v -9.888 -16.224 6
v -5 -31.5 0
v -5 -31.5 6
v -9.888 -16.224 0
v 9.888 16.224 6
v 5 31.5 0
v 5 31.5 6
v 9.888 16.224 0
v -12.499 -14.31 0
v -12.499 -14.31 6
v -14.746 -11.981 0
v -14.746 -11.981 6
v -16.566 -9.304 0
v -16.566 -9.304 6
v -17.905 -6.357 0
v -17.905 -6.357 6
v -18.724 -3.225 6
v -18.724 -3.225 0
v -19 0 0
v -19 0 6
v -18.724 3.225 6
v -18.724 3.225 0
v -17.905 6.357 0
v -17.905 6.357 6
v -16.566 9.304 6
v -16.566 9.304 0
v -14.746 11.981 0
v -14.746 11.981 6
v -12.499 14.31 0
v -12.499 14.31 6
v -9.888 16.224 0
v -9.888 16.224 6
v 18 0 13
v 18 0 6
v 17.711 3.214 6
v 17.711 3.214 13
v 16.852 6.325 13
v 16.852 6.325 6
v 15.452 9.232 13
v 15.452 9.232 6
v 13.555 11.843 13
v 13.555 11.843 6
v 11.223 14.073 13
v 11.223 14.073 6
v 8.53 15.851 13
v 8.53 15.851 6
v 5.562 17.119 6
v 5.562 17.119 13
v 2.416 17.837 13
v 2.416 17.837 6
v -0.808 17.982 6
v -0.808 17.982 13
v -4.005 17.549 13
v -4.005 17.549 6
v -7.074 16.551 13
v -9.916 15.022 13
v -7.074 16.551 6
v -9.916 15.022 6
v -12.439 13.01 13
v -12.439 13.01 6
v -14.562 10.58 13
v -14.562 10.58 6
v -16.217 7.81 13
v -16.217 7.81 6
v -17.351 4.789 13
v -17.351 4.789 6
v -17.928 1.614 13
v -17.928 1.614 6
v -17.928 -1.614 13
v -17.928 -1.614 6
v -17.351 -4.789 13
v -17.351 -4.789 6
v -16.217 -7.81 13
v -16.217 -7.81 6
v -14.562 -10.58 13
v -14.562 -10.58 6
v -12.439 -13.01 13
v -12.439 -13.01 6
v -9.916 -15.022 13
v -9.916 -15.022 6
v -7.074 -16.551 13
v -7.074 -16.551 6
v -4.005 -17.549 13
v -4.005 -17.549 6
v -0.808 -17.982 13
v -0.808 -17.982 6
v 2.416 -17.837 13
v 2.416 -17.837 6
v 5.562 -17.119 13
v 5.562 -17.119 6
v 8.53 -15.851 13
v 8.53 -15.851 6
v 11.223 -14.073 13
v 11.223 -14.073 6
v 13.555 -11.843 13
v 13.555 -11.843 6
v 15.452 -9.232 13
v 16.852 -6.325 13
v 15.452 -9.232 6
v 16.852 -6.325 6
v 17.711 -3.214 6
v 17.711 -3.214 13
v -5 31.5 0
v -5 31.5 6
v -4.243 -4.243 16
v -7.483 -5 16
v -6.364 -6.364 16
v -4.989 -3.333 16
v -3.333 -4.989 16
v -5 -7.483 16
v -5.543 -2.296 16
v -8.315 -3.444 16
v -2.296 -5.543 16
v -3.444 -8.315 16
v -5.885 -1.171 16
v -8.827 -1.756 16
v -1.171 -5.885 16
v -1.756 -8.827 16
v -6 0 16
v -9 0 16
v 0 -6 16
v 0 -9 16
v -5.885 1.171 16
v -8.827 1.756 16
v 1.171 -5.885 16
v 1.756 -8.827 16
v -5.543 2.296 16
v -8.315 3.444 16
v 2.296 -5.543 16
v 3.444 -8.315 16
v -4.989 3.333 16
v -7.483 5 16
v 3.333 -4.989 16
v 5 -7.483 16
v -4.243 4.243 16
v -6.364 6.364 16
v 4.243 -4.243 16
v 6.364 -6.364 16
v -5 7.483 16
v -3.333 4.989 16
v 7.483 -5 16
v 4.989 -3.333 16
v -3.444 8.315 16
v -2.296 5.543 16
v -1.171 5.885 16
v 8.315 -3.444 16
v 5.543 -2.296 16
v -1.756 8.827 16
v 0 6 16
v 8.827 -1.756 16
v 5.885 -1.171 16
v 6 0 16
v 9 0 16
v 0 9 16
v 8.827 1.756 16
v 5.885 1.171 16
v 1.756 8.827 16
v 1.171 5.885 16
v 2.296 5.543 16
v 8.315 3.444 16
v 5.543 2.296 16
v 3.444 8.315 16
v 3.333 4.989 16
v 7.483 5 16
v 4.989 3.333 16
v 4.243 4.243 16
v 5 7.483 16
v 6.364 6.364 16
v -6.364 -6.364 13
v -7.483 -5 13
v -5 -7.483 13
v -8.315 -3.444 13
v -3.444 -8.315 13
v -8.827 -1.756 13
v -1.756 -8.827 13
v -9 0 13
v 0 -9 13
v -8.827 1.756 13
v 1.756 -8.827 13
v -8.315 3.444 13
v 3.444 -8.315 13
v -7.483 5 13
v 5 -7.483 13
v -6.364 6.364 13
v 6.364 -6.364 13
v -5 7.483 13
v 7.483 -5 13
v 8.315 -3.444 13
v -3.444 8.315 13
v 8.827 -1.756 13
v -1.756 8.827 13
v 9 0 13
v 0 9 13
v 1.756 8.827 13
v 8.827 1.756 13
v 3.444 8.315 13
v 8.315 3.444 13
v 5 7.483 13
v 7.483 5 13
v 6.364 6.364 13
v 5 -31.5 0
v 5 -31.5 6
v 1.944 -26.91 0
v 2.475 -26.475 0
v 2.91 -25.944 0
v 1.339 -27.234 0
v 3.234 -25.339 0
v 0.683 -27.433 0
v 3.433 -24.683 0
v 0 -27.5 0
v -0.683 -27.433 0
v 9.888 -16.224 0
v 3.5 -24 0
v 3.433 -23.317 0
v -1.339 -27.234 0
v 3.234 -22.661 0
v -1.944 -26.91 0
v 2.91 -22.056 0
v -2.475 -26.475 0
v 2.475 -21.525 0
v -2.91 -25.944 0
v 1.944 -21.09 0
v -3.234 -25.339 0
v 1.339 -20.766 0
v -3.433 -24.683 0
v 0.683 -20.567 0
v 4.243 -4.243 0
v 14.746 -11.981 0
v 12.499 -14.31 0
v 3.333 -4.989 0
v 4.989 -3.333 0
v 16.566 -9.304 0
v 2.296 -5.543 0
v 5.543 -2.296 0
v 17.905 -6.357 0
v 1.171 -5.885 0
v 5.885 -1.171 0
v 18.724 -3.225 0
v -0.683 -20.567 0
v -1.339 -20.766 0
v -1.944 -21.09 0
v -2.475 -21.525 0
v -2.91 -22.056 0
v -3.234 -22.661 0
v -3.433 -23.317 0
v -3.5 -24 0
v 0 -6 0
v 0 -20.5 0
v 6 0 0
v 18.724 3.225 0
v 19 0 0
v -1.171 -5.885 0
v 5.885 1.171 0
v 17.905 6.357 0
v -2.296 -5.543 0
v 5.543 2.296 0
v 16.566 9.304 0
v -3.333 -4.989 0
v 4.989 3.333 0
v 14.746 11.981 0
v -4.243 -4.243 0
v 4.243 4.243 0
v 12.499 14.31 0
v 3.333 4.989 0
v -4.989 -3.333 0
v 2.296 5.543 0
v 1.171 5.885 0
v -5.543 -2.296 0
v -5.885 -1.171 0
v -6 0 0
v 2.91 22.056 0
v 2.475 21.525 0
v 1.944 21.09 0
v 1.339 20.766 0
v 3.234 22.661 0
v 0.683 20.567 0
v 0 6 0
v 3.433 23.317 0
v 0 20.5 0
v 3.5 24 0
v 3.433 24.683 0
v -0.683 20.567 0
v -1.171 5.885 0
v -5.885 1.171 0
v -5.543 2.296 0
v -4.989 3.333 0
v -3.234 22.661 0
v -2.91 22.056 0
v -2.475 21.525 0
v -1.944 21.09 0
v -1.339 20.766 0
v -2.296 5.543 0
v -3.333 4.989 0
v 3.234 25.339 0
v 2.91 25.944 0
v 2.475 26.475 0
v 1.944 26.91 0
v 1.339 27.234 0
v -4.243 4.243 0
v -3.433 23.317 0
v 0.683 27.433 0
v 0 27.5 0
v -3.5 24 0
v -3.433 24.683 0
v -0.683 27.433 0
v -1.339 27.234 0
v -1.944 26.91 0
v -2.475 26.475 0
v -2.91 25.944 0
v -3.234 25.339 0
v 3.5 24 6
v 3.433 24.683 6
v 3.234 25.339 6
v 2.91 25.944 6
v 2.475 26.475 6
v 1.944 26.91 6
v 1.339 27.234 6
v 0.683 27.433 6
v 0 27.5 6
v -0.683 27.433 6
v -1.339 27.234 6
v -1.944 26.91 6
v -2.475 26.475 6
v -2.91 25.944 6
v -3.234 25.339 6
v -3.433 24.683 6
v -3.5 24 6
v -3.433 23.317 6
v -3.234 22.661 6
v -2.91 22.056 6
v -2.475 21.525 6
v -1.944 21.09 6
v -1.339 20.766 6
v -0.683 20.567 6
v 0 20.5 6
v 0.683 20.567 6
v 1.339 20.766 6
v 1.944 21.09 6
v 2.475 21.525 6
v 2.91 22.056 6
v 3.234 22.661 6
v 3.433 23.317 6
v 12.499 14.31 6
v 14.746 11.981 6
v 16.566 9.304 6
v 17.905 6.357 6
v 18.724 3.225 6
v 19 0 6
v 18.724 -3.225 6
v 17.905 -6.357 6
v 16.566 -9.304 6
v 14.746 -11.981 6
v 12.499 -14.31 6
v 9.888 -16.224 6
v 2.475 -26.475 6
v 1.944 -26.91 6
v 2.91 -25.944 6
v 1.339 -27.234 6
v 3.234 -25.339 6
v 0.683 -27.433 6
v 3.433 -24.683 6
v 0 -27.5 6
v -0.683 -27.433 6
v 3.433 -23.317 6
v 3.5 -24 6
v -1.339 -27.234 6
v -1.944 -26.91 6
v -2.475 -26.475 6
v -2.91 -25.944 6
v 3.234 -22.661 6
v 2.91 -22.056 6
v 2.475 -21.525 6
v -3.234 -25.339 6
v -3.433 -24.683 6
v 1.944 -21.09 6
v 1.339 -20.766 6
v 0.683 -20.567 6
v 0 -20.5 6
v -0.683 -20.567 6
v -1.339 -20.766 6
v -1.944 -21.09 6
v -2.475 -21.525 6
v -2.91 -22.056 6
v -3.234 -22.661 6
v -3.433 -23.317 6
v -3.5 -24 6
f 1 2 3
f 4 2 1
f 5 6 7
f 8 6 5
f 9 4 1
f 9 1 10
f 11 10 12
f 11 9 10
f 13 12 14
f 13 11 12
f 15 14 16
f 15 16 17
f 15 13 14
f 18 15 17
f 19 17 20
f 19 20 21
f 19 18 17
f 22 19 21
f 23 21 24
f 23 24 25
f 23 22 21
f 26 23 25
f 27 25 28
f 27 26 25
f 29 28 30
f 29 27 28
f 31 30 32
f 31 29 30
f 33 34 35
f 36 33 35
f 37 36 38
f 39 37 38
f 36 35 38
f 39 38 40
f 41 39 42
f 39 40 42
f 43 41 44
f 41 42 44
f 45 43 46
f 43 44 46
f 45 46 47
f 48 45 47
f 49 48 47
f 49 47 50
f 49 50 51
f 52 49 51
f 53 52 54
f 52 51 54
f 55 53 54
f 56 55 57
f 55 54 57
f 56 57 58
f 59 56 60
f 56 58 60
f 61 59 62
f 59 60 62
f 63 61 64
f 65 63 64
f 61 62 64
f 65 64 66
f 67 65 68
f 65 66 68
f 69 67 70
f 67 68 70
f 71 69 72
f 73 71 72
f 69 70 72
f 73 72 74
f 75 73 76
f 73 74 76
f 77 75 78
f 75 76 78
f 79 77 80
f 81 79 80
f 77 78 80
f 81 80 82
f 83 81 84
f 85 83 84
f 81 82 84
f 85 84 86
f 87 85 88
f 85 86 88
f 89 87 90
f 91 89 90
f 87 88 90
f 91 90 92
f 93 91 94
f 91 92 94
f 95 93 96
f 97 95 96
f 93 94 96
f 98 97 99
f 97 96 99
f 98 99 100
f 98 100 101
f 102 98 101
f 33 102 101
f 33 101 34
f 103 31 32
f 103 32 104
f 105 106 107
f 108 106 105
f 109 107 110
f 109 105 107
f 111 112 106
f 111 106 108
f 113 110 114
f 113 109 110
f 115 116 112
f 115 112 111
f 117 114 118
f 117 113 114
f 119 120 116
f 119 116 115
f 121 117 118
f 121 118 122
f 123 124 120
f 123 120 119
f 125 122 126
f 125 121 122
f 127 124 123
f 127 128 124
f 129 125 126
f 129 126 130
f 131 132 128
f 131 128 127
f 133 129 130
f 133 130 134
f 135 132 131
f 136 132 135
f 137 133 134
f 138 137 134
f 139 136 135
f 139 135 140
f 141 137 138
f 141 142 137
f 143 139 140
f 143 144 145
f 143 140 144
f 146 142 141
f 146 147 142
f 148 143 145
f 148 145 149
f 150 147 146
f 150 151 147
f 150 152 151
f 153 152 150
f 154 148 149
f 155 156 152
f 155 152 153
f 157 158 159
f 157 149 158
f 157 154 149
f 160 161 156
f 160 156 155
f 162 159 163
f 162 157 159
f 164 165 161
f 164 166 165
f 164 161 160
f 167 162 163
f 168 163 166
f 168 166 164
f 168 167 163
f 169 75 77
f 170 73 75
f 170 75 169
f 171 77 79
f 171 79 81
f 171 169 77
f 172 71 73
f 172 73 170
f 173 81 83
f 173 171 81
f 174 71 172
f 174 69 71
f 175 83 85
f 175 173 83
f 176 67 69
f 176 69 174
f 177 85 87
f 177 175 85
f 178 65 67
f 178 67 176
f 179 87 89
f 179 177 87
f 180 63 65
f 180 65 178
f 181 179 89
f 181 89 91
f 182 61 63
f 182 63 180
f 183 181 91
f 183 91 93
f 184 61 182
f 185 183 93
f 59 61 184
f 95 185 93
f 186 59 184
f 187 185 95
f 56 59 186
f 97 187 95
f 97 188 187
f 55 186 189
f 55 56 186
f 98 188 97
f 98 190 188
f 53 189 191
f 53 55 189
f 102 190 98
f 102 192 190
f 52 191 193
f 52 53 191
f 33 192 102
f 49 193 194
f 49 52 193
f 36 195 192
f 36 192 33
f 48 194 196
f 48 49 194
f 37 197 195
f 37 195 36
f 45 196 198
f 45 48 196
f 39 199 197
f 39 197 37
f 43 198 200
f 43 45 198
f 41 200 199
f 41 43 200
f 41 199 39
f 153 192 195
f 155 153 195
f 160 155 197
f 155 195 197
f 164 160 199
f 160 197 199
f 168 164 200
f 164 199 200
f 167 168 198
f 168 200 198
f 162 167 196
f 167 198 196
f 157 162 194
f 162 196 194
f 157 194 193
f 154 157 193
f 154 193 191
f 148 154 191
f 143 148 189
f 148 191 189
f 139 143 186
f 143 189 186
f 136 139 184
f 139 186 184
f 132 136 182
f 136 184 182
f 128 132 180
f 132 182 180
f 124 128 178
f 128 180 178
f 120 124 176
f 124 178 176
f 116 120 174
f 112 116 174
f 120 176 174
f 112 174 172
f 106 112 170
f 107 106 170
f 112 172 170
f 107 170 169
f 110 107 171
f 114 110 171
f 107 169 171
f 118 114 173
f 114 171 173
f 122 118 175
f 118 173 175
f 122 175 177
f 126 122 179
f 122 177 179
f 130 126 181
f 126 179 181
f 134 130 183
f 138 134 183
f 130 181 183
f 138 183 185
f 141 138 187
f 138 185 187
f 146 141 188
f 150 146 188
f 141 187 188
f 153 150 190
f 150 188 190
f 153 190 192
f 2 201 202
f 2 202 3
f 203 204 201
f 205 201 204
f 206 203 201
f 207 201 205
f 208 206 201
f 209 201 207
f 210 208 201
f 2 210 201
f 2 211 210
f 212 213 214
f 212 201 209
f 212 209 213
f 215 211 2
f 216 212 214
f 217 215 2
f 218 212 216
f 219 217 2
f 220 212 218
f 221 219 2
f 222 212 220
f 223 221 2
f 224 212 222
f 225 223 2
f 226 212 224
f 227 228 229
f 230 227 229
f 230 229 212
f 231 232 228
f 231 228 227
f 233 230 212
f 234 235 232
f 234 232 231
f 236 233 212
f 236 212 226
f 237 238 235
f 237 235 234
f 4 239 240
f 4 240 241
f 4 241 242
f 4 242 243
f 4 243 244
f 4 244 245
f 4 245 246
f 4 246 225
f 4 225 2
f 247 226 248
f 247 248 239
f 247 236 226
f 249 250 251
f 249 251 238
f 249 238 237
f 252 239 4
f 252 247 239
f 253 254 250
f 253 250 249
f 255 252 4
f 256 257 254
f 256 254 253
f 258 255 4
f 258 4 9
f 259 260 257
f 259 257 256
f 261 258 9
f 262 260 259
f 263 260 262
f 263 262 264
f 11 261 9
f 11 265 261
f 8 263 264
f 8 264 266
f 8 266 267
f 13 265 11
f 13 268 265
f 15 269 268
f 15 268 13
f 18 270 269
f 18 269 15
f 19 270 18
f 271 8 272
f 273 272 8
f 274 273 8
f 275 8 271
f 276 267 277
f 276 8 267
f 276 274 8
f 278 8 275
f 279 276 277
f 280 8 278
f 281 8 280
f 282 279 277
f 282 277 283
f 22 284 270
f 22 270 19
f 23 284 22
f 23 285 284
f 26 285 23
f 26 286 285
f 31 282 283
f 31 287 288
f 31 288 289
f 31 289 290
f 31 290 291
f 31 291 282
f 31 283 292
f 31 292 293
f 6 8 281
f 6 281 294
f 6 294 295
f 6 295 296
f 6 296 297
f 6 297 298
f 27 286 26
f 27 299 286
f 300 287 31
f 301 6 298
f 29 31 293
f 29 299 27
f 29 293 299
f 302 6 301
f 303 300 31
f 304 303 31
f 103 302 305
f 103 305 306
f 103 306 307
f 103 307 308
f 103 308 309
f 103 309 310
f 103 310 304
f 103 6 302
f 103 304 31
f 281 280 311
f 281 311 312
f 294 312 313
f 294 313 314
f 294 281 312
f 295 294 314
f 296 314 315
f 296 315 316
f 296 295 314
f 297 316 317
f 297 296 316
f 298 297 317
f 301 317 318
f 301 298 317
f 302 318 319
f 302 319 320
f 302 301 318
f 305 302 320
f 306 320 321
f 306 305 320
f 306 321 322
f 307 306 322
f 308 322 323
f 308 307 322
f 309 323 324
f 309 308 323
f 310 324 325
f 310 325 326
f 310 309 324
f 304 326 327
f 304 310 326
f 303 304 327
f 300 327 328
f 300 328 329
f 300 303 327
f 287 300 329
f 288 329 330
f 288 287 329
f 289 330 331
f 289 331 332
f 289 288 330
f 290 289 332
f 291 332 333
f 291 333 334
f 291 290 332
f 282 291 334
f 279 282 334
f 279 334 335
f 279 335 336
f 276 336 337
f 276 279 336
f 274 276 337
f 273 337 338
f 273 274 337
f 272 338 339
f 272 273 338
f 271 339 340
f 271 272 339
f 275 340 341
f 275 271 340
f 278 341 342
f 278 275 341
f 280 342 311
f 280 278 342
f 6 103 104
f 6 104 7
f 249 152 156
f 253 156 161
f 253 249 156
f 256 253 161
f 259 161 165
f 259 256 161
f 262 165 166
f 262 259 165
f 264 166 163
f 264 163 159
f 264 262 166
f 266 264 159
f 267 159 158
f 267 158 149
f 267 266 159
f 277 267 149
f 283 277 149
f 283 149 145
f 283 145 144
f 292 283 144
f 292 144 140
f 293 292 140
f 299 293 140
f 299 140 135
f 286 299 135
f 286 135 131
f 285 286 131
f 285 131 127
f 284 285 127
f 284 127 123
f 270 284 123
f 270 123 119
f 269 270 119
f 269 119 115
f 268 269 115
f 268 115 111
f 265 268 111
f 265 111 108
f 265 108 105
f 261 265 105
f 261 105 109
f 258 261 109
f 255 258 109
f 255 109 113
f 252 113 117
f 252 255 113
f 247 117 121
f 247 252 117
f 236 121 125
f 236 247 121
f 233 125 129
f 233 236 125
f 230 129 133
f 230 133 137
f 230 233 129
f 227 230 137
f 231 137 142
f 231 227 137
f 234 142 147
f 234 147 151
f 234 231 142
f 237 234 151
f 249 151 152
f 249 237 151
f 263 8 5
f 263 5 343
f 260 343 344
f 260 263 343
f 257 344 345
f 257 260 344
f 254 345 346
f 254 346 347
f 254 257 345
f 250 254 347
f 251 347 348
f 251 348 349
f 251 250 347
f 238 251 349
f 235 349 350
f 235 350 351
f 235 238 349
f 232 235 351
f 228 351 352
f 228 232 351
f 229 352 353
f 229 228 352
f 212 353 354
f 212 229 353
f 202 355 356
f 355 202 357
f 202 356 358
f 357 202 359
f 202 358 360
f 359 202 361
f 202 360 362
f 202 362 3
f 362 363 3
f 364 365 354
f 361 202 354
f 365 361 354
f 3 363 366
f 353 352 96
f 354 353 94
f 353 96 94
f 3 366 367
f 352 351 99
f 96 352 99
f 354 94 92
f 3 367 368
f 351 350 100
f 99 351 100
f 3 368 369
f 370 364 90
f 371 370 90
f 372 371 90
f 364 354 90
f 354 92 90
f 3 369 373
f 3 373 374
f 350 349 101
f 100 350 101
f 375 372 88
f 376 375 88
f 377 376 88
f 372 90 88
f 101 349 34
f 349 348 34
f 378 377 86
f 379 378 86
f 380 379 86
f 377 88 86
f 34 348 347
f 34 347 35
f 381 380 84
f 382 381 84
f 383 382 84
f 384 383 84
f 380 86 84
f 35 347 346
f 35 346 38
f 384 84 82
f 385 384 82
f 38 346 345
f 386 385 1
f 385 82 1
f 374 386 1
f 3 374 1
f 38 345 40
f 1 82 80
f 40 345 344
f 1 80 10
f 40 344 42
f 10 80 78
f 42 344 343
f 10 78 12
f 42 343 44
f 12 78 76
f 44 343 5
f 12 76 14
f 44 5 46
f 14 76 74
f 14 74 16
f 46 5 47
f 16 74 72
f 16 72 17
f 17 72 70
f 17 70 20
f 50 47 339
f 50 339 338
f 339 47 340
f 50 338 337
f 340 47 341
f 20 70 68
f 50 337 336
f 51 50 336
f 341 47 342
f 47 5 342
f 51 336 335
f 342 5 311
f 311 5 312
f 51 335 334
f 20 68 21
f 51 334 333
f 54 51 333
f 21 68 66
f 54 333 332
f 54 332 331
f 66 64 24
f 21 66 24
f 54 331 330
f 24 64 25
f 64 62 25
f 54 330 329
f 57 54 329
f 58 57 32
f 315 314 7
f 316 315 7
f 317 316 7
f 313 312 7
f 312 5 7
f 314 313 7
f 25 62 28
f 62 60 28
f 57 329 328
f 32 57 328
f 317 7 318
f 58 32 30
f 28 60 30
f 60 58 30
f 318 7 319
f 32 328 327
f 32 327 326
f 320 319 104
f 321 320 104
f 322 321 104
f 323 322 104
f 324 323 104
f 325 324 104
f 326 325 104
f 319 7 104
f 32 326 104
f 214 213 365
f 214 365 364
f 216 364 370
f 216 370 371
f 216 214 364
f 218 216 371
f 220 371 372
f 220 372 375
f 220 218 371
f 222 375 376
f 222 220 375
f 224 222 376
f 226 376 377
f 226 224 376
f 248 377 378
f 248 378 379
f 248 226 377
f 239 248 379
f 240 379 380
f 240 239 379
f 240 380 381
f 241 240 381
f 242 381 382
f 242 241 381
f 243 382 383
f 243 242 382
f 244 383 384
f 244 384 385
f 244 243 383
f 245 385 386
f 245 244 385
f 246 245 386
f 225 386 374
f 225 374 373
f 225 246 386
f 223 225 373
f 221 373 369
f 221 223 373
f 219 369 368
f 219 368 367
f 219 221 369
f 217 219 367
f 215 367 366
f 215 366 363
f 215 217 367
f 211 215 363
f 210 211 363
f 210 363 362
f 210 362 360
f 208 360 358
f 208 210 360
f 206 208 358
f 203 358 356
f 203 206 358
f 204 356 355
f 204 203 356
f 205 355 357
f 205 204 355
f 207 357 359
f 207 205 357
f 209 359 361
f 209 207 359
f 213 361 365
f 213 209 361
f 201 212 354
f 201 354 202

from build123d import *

# Parameters (mm, degrees)
SKETCH_1_R          = 3.5
SKETCH_1_R_2        = 6
EXTRUDE_1_DEPTH     = 6
SKETCH_2_R          = 18
EXTRUDE_2_DEPTH     = 7
SKETCH_3_R          = 9
EXTRUDE_3_DEPTH     = 3
SKETCH_4_R          = 6
CUT_EXTRUDE_1_DEPTH = 41.115458367


with BuildPart() as part:
    # 草圖1 → 填料-伸長1 (new body)
    with BuildSketch(Plane.XY):
        with BuildLine():
            Line((-5, 31.5), (5, 31.5))
            Line((5, 31.5), (9.888283839, 16.224113002))
            ThreePointArc((9.888283839, 16.224113002), (19, 0), (9.888283839, -16.224113002))
            Line((9.888283839, -16.224113002), (5, -31.5))
            Line((5, -31.5), (-5, -31.5))
            Line((-5, -31.5), (-9.888283839, -16.224113002))
            ThreePointArc((-9.888283839, -16.224113002), (-19, 0), (-9.888283839, 16.224113002))
            Line((-9.888283839, 16.224113002), (-5, 31.5))
        make_face()
        with Locations((0, 24)):
            Circle(SKETCH_1_R, mode=Mode.SUBTRACT)
        with Locations((0, -24)):
            Circle(SKETCH_1_R, mode=Mode.SUBTRACT)
        Circle(SKETCH_1_R_2, mode=Mode.SUBTRACT)
    extrude(amount=EXTRUDE_1_DEPTH)

    # 草圖2 → 填料-伸長2 (add)
    with BuildSketch(Plane.XY.offset(6)):
        Circle(SKETCH_2_R)
    extrude(amount=EXTRUDE_2_DEPTH)

    # 草圖3 → 填料-伸長3 (add)
    with BuildSketch(Plane.XY.offset(13)):
        Circle(SKETCH_3_R)
    extrude(amount=EXTRUDE_3_DEPTH)

    # 草圖4 → 除料-伸長1 (cut, through all)
    with BuildSketch(Plane.XY.offset(16)):
        Circle(SKETCH_4_R)
    extrude(amount=-CUT_EXTRUDE_1_DEPTH, mode=Mode.SUBTRACT)


solid = part.part
